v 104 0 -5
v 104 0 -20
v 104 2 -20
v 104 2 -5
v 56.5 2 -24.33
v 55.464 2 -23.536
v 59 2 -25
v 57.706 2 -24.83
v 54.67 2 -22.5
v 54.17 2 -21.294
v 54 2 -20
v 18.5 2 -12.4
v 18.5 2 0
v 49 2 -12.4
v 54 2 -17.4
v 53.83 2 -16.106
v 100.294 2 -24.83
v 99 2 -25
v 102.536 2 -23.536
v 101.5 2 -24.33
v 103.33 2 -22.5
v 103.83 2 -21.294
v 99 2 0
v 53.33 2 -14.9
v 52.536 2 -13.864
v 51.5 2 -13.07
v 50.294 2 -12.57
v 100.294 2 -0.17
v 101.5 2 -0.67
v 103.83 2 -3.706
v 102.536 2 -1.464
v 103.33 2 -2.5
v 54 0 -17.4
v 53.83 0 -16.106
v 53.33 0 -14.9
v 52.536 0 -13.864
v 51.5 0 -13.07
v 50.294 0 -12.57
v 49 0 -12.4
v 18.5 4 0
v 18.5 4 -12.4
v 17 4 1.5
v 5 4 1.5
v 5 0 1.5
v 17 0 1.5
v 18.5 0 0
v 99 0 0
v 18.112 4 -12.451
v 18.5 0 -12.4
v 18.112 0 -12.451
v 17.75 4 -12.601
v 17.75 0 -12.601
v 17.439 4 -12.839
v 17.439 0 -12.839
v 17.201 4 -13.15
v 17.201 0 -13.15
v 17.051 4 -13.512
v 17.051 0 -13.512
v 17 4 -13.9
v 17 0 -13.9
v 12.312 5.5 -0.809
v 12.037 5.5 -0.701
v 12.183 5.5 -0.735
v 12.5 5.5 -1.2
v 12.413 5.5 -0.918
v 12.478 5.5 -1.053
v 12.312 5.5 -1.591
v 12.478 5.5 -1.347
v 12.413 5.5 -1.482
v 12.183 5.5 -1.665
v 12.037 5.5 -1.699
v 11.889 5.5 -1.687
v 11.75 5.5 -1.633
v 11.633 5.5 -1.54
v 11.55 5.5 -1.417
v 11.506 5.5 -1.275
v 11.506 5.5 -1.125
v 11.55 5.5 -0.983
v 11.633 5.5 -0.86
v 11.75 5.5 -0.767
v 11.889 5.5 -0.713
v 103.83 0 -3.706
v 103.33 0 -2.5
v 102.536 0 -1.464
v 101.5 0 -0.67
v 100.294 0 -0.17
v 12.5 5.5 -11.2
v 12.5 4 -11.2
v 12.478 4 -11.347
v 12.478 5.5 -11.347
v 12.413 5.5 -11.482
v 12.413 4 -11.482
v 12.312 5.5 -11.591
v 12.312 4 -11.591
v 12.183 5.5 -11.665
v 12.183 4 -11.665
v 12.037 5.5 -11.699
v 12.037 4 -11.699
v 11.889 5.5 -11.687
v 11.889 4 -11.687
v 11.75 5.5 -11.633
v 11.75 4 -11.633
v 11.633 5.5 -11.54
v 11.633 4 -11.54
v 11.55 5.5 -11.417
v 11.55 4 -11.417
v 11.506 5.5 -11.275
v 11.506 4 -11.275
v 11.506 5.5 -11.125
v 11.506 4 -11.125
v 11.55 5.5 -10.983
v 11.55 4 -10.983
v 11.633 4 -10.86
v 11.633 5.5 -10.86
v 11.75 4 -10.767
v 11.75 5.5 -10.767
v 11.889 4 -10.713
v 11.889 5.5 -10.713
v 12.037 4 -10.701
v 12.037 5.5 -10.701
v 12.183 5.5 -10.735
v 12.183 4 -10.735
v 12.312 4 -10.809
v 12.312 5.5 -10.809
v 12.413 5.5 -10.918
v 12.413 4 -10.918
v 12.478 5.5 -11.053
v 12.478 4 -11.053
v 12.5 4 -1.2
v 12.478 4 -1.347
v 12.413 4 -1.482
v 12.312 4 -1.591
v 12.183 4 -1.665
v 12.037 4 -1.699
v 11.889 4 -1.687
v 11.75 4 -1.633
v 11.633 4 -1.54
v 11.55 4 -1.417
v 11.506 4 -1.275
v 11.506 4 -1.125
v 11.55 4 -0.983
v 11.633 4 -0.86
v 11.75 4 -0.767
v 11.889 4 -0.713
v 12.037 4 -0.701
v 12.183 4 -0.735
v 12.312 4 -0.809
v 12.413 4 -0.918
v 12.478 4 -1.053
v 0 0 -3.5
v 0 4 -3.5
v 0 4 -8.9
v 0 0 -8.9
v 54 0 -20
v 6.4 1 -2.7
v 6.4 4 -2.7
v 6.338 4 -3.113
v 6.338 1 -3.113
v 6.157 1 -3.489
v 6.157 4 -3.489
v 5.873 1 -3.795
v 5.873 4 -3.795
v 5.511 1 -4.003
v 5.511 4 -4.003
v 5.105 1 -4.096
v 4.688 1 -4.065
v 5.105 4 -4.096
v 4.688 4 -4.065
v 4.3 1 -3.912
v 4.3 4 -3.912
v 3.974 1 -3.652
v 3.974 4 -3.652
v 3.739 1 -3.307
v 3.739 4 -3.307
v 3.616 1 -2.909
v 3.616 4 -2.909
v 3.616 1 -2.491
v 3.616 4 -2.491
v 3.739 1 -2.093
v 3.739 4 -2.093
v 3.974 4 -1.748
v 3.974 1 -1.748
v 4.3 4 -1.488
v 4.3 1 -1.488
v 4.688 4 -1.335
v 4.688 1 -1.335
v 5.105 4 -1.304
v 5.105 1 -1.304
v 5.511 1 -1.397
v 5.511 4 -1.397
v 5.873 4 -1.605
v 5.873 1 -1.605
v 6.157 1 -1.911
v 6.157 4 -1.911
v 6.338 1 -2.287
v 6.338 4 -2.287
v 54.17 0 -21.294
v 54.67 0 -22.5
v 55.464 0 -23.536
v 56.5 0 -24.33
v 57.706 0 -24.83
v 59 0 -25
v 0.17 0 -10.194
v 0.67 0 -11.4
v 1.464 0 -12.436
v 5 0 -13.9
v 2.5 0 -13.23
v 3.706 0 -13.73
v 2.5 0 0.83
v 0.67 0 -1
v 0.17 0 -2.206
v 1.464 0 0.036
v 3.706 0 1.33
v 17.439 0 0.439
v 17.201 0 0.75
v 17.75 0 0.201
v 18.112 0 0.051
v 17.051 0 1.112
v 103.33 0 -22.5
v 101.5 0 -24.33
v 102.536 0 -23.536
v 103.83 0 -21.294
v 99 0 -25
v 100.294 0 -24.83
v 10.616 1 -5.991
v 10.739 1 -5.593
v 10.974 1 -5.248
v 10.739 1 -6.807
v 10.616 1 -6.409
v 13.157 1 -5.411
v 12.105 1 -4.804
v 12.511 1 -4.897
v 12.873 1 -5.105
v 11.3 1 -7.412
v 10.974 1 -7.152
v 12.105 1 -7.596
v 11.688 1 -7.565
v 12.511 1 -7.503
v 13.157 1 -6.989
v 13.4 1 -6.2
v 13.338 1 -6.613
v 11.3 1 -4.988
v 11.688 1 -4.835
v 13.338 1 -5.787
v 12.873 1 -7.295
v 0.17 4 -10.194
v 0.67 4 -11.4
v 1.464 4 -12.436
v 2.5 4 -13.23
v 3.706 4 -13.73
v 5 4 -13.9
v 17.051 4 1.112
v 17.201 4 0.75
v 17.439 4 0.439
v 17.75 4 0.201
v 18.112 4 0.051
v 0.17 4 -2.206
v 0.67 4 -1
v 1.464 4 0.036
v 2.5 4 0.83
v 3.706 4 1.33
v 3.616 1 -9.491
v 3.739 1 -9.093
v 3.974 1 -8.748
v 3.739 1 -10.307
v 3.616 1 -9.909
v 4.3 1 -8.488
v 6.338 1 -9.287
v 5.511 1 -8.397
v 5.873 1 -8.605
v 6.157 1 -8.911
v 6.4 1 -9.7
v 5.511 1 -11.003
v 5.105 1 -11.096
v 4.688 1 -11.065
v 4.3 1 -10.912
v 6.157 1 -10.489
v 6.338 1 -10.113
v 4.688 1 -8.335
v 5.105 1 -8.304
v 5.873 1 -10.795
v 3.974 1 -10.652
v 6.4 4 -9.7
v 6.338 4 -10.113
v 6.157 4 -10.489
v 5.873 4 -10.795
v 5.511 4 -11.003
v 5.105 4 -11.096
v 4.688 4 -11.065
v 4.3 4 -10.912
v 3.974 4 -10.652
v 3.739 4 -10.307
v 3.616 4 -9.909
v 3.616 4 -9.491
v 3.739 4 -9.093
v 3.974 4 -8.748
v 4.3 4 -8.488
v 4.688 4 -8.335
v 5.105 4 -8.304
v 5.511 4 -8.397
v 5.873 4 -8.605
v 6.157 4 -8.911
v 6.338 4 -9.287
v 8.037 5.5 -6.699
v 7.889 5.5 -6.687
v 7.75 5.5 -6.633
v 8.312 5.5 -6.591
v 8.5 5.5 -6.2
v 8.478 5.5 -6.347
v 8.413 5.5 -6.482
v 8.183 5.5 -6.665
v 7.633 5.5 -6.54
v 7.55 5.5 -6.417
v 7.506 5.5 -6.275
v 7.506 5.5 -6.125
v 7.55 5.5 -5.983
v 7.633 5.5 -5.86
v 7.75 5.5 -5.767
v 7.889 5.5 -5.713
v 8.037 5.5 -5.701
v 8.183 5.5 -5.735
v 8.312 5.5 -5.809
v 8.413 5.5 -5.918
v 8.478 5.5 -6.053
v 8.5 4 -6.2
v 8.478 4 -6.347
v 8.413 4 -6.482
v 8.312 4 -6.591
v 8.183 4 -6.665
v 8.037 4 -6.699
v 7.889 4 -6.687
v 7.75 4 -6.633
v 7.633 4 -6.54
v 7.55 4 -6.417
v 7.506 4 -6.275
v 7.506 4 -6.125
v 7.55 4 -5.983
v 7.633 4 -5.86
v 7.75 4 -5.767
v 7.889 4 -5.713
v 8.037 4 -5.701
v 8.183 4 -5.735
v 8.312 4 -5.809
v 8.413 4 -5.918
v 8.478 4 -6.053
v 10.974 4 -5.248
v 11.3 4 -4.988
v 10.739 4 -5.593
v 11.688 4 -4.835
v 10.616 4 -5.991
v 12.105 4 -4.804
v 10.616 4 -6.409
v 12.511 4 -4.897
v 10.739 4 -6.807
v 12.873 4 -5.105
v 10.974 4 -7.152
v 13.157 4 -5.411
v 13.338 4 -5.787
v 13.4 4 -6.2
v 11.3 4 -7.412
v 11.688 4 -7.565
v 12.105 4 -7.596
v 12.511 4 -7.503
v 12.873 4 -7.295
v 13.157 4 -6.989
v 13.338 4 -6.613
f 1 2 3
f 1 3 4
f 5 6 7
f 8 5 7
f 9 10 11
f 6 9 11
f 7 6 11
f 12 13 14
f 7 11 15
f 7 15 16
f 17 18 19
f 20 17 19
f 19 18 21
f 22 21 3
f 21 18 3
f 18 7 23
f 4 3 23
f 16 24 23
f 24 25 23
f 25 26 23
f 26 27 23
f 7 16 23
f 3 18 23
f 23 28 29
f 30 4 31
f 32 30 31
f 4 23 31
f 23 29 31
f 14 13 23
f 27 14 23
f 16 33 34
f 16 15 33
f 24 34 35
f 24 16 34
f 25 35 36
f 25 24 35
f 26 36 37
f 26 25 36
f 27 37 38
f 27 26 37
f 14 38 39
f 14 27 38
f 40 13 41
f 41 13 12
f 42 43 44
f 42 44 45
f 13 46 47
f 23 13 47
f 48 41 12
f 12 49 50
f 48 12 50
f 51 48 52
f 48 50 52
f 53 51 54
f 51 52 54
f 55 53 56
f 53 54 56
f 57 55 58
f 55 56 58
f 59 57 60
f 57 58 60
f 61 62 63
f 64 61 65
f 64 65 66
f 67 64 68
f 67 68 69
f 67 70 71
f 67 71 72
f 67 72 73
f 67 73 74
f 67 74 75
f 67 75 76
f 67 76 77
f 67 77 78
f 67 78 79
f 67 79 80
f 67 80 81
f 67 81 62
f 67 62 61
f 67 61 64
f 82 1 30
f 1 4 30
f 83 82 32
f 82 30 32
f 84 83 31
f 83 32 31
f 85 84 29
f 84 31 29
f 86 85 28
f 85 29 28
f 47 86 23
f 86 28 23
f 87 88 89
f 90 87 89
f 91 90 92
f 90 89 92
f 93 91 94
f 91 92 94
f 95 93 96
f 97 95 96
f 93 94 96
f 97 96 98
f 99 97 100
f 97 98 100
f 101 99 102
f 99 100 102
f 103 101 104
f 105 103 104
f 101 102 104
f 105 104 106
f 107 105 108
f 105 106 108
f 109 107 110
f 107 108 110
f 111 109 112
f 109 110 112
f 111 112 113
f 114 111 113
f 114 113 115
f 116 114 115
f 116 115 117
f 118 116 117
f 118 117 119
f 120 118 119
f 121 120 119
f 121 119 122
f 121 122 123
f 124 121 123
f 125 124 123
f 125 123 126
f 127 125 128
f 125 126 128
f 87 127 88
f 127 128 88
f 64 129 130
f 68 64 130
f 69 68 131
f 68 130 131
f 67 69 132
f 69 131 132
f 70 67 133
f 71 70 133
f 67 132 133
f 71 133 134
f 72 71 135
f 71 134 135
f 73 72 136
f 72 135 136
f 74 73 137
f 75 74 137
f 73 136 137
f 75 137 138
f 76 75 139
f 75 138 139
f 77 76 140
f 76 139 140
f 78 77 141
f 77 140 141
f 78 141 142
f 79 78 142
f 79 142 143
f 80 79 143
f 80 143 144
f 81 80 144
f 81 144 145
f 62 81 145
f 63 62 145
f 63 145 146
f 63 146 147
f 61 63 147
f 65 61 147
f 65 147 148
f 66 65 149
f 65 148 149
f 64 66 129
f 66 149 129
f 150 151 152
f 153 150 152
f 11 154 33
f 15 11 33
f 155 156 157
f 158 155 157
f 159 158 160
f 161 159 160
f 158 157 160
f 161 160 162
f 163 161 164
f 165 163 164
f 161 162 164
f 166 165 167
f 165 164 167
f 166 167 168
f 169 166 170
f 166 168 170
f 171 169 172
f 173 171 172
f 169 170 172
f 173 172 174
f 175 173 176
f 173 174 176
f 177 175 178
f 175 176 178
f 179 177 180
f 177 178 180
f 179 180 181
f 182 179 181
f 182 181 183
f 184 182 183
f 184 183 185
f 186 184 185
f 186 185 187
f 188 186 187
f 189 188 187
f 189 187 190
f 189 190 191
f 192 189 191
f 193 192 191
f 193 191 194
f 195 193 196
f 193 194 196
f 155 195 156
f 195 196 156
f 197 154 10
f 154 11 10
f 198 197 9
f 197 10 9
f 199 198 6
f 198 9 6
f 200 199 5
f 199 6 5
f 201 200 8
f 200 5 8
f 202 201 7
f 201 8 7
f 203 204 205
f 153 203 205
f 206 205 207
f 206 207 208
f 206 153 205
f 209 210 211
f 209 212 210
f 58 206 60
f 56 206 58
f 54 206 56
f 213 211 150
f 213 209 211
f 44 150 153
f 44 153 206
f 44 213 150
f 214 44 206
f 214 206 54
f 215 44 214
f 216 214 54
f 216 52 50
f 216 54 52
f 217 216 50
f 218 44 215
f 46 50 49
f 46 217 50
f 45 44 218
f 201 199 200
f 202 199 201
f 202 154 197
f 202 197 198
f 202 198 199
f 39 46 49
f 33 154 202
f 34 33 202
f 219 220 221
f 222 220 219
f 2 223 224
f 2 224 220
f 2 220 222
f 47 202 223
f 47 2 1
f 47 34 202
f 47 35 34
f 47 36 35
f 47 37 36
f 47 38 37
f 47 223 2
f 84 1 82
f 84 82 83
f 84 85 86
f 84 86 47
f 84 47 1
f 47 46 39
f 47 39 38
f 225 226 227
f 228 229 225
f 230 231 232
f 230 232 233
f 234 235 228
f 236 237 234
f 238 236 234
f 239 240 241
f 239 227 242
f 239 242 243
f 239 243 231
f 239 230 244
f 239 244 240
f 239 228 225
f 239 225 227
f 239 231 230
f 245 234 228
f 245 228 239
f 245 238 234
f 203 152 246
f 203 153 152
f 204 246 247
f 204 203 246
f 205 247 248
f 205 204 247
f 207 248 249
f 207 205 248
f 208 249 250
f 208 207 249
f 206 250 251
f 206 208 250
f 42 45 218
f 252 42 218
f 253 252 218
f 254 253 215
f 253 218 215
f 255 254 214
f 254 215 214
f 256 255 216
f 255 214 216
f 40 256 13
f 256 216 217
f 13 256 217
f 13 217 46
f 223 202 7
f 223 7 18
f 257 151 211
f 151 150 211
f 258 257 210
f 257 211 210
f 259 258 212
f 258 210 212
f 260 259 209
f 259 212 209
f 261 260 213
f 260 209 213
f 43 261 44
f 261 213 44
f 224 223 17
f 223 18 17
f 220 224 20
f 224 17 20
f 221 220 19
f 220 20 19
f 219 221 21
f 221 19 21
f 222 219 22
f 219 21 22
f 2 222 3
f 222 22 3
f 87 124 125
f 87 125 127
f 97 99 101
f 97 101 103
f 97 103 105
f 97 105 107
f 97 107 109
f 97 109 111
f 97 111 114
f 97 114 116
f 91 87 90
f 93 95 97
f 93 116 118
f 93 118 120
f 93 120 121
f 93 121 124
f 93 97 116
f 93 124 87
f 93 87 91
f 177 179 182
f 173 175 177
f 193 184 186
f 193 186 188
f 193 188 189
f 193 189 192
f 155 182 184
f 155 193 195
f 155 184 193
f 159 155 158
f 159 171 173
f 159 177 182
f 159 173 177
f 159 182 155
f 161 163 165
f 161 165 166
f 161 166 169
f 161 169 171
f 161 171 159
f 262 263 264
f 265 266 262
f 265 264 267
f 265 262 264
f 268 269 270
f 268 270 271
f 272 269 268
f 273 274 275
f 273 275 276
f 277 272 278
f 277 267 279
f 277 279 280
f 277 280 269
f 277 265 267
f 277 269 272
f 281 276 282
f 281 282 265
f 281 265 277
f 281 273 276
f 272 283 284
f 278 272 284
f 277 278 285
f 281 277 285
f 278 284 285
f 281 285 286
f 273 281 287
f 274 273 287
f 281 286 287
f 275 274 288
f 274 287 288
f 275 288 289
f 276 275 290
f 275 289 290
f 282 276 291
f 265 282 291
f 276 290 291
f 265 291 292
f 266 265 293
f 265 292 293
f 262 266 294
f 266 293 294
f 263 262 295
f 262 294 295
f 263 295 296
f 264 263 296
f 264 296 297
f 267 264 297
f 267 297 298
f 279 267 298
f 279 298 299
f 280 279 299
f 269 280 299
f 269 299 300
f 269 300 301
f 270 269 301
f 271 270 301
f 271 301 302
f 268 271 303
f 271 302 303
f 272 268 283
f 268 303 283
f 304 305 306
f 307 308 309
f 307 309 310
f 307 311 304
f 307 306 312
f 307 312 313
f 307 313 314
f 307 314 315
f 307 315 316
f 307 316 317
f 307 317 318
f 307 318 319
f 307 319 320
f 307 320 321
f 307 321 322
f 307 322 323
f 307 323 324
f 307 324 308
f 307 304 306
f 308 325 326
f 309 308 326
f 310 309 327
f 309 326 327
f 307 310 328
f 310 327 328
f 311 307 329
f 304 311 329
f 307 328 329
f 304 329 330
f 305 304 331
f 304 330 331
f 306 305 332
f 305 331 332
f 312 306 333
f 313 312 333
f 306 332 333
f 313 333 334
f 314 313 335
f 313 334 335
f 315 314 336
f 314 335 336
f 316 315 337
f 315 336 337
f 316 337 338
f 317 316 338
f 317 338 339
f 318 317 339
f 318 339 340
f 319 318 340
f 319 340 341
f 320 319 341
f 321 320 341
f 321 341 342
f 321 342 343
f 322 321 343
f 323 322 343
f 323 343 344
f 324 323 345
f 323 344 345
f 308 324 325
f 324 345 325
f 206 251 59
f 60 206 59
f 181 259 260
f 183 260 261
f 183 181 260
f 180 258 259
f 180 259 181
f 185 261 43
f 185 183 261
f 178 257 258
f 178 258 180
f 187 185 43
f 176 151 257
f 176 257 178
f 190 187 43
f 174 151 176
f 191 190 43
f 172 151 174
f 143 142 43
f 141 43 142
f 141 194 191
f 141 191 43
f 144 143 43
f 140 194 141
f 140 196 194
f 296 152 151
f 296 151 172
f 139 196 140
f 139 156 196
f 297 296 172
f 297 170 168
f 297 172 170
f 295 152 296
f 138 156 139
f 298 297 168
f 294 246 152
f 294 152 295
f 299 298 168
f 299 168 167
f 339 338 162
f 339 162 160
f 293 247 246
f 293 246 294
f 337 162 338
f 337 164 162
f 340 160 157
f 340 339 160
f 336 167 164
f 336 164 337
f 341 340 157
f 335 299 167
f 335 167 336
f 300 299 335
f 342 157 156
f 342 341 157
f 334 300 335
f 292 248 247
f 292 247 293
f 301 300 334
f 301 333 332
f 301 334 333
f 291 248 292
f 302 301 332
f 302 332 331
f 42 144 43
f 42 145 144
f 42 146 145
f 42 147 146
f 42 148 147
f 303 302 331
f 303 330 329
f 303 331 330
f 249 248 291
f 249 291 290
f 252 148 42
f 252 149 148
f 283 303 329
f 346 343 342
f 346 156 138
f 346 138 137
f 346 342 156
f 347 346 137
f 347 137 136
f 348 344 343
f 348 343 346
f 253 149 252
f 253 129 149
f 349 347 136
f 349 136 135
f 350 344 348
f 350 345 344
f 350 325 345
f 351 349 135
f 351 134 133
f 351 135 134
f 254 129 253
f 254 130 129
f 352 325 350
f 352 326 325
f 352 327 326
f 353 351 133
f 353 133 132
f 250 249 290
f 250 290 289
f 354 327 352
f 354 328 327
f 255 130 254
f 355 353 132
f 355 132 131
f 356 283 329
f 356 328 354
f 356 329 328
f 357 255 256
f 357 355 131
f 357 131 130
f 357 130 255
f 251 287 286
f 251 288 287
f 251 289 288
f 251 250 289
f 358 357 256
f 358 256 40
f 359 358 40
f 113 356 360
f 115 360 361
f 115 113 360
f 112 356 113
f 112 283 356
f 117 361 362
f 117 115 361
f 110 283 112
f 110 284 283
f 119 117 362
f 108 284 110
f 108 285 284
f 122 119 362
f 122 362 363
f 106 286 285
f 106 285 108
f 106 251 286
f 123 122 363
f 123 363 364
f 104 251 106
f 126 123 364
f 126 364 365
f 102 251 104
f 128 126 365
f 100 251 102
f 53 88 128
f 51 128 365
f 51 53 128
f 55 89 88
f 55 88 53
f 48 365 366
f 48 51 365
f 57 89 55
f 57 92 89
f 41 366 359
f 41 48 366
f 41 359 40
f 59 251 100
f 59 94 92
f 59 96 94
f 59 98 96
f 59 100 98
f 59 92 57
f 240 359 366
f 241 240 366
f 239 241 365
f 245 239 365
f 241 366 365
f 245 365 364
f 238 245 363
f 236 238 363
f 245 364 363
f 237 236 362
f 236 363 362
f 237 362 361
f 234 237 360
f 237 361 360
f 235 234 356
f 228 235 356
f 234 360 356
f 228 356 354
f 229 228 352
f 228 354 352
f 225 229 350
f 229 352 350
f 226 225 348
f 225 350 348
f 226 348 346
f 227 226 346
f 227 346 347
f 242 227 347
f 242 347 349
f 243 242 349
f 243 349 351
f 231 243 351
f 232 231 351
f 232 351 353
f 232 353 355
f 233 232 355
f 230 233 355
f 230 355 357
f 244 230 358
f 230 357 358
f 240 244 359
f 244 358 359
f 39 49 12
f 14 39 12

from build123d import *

# Parameters (mm, degrees)
SKETCH_1_W          = 17
SKETCH_1_H          = 12.4
EXTRUDE_1_DEPTH     = 4
SKETCH_2_R          = 1.4
CUT_EXTRUDE_1_DEPTH = 3
SKETCH_3_W          = 12.4
SKETCH_3_H          = 2
EXTRUDE_2_DEPTH     = 37
SKETCH_4_W          = 17
SKETCH_4_H          = 1.5
EXTRUDE_3_DEPTH     = 4
FILLET_1_R          = 5
SKETCH_5_R          = 0.5
EXTRUDE_4_DEPTH     = 1.5
EXTRUDE_5_DEPTH     = 2
SKETCH_7_W          = 50
SKETCH_7_H          = 25
EXTRUDE_6_DEPTH     = 2
FILLET_2_R          = 5
FILLET_3_R          = 5
EXTRUDE_7_DEPTH     = 2


with BuildPart() as part:
    # 草图1 → 凸台-拉伸1 (new body)
    with BuildSketch(Plane(origin=(0, 0, 0), x_dir=(1, 0, 0), z_dir=(0, 1, 0))):
        with Locations((8.5, 6.2)):
            Rectangle(SKETCH_1_W, SKETCH_1_H)
    extrude(amount=EXTRUDE_1_DEPTH)

    # 草图2 → 切除-拉伸1 (cut)
    with BuildSketch(Plane(origin=(0, 4, 0), x_dir=(1, 0, 0), z_dir=(0, 1, 0))):
        with Locations((12, 6.2)):
            Circle(SKETCH_2_R)
        with Locations((5, 9.7)):
            Circle(SKETCH_2_R)
        with Locations((5, 2.7)):
            Circle(SKETCH_2_R)
    extrude(amount=-CUT_EXTRUDE_1_DEPTH, mode=Mode.SUBTRACT)

    # 草图3 → 凸台-拉伸2 (add)
    with BuildSketch(Plane(origin=(17, 0, 0), x_dir=(0, 0, -1), z_dir=(1, 0, 0))):
        with Locations((6.2, 1)):
            Rectangle(SKETCH_3_W, SKETCH_3_H)
    extrude(amount=EXTRUDE_2_DEPTH)

    # 草图4 → 凸台-拉伸3 (add)
    with BuildSketch(Plane(origin=(0, 4, 0), x_dir=(1, 0, 0), z_dir=(0, 1, 0))):
        with Locations((8.5, 13.15)):
            Rectangle(SKETCH_4_W, SKETCH_4_H)
        with Locations((8.5, -0.75)):
            Rectangle(SKETCH_4_W, SKETCH_4_H)
    extrude(amount=-EXTRUDE_3_DEPTH)

    # 圆角1
    fillet_1_edges = [part.edges().sort_by_distance(p)[0] for p in [
        (0, 2, -13.9),
        (0, 2, 1.5),
    ]]
    fillet(fillet_1_edges, radius=FILLET_1_R)

    # 草图5 → 凸台-拉伸4 (add)
    with BuildSketch(Plane(origin=(0, 4, 0), x_dir=(1, 0, 0), z_dir=(0, 1, 0))):
        with Locations((8, 6.2)):
            Circle(SKETCH_5_R)
        with Locations((12, 11.2)):
            Circle(SKETCH_5_R)
        with Locations((12, 1.2)):
            Circle(SKETCH_5_R)
    extrude(amount=EXTRUDE_4_DEPTH)

    # 草图6 → 凸台-拉伸5 (add)
    with BuildSketch(Plane(origin=(0, 2, 0), x_dir=(1, 0, 0), z_dir=(0, 1, 0))):
        with BuildLine():
            Line((17, 13.9), (17, 12.4))
            Line((17, 12.4), (18.5, 12.4))
            ThreePointArc((18.5, 12.4), (17.439339828, 12.839339828), (17, 13.9))
        make_face()
        with BuildLine():
            Line((17, -1.5), (17, 0))
            Line((17, 0), (18.5, 0))
            ThreePointArc((18.5, 0), (17.439339828, -0.439339828), (17, -1.5))
        make_face()
    extrude(amount=-EXTRUDE_5_DEPTH)

    # 草图7 → 凸台-拉伸6 (add)
    with BuildSketch(Plane.XZ):
        with Locations((79, -12.5)):
            Rectangle(SKETCH_7_W, SKETCH_7_H)
    extrude(amount=-EXTRUDE_6_DEPTH)

    # 圆角2
    fillet_2_edges = [part.edges().sort_by_distance(p)[0] for p in [
        (54, 1, -25),
        (54, 1, -12.4),
    ]]
    fillet(fillet_2_edges, radius=FILLET_2_R)

    # 圆角3
    fillet_3_edges = [part.edges().sort_by_distance(p)[0] for p in [
        (104, 1, 0),
        (104, 1, -25),
    ]]
    fillet(fillet_3_edges, radius=FILLET_3_R)

    # 草图8 → 凸台-拉伸7 (add)
    with BuildSketch(Plane(origin=(0, 2, 0), x_dir=(1, 0, 0), z_dir=(0, 1, 0))):
        with BuildLine():
            Line((18.5, 0), (18.5, 12.4))
            ThreePointArc((18.5, 12.4), (17.439339828, 12.839339828), (17, 13.9))
            Line((17, 13.9), (17, -1.5))
            ThreePointArc((17, -1.5), (17.439339828, -0.439339828), (18.5, 0))
        make_face()
    extrude(amount=EXTRUDE_7_DEPTH)


solid = part.part
